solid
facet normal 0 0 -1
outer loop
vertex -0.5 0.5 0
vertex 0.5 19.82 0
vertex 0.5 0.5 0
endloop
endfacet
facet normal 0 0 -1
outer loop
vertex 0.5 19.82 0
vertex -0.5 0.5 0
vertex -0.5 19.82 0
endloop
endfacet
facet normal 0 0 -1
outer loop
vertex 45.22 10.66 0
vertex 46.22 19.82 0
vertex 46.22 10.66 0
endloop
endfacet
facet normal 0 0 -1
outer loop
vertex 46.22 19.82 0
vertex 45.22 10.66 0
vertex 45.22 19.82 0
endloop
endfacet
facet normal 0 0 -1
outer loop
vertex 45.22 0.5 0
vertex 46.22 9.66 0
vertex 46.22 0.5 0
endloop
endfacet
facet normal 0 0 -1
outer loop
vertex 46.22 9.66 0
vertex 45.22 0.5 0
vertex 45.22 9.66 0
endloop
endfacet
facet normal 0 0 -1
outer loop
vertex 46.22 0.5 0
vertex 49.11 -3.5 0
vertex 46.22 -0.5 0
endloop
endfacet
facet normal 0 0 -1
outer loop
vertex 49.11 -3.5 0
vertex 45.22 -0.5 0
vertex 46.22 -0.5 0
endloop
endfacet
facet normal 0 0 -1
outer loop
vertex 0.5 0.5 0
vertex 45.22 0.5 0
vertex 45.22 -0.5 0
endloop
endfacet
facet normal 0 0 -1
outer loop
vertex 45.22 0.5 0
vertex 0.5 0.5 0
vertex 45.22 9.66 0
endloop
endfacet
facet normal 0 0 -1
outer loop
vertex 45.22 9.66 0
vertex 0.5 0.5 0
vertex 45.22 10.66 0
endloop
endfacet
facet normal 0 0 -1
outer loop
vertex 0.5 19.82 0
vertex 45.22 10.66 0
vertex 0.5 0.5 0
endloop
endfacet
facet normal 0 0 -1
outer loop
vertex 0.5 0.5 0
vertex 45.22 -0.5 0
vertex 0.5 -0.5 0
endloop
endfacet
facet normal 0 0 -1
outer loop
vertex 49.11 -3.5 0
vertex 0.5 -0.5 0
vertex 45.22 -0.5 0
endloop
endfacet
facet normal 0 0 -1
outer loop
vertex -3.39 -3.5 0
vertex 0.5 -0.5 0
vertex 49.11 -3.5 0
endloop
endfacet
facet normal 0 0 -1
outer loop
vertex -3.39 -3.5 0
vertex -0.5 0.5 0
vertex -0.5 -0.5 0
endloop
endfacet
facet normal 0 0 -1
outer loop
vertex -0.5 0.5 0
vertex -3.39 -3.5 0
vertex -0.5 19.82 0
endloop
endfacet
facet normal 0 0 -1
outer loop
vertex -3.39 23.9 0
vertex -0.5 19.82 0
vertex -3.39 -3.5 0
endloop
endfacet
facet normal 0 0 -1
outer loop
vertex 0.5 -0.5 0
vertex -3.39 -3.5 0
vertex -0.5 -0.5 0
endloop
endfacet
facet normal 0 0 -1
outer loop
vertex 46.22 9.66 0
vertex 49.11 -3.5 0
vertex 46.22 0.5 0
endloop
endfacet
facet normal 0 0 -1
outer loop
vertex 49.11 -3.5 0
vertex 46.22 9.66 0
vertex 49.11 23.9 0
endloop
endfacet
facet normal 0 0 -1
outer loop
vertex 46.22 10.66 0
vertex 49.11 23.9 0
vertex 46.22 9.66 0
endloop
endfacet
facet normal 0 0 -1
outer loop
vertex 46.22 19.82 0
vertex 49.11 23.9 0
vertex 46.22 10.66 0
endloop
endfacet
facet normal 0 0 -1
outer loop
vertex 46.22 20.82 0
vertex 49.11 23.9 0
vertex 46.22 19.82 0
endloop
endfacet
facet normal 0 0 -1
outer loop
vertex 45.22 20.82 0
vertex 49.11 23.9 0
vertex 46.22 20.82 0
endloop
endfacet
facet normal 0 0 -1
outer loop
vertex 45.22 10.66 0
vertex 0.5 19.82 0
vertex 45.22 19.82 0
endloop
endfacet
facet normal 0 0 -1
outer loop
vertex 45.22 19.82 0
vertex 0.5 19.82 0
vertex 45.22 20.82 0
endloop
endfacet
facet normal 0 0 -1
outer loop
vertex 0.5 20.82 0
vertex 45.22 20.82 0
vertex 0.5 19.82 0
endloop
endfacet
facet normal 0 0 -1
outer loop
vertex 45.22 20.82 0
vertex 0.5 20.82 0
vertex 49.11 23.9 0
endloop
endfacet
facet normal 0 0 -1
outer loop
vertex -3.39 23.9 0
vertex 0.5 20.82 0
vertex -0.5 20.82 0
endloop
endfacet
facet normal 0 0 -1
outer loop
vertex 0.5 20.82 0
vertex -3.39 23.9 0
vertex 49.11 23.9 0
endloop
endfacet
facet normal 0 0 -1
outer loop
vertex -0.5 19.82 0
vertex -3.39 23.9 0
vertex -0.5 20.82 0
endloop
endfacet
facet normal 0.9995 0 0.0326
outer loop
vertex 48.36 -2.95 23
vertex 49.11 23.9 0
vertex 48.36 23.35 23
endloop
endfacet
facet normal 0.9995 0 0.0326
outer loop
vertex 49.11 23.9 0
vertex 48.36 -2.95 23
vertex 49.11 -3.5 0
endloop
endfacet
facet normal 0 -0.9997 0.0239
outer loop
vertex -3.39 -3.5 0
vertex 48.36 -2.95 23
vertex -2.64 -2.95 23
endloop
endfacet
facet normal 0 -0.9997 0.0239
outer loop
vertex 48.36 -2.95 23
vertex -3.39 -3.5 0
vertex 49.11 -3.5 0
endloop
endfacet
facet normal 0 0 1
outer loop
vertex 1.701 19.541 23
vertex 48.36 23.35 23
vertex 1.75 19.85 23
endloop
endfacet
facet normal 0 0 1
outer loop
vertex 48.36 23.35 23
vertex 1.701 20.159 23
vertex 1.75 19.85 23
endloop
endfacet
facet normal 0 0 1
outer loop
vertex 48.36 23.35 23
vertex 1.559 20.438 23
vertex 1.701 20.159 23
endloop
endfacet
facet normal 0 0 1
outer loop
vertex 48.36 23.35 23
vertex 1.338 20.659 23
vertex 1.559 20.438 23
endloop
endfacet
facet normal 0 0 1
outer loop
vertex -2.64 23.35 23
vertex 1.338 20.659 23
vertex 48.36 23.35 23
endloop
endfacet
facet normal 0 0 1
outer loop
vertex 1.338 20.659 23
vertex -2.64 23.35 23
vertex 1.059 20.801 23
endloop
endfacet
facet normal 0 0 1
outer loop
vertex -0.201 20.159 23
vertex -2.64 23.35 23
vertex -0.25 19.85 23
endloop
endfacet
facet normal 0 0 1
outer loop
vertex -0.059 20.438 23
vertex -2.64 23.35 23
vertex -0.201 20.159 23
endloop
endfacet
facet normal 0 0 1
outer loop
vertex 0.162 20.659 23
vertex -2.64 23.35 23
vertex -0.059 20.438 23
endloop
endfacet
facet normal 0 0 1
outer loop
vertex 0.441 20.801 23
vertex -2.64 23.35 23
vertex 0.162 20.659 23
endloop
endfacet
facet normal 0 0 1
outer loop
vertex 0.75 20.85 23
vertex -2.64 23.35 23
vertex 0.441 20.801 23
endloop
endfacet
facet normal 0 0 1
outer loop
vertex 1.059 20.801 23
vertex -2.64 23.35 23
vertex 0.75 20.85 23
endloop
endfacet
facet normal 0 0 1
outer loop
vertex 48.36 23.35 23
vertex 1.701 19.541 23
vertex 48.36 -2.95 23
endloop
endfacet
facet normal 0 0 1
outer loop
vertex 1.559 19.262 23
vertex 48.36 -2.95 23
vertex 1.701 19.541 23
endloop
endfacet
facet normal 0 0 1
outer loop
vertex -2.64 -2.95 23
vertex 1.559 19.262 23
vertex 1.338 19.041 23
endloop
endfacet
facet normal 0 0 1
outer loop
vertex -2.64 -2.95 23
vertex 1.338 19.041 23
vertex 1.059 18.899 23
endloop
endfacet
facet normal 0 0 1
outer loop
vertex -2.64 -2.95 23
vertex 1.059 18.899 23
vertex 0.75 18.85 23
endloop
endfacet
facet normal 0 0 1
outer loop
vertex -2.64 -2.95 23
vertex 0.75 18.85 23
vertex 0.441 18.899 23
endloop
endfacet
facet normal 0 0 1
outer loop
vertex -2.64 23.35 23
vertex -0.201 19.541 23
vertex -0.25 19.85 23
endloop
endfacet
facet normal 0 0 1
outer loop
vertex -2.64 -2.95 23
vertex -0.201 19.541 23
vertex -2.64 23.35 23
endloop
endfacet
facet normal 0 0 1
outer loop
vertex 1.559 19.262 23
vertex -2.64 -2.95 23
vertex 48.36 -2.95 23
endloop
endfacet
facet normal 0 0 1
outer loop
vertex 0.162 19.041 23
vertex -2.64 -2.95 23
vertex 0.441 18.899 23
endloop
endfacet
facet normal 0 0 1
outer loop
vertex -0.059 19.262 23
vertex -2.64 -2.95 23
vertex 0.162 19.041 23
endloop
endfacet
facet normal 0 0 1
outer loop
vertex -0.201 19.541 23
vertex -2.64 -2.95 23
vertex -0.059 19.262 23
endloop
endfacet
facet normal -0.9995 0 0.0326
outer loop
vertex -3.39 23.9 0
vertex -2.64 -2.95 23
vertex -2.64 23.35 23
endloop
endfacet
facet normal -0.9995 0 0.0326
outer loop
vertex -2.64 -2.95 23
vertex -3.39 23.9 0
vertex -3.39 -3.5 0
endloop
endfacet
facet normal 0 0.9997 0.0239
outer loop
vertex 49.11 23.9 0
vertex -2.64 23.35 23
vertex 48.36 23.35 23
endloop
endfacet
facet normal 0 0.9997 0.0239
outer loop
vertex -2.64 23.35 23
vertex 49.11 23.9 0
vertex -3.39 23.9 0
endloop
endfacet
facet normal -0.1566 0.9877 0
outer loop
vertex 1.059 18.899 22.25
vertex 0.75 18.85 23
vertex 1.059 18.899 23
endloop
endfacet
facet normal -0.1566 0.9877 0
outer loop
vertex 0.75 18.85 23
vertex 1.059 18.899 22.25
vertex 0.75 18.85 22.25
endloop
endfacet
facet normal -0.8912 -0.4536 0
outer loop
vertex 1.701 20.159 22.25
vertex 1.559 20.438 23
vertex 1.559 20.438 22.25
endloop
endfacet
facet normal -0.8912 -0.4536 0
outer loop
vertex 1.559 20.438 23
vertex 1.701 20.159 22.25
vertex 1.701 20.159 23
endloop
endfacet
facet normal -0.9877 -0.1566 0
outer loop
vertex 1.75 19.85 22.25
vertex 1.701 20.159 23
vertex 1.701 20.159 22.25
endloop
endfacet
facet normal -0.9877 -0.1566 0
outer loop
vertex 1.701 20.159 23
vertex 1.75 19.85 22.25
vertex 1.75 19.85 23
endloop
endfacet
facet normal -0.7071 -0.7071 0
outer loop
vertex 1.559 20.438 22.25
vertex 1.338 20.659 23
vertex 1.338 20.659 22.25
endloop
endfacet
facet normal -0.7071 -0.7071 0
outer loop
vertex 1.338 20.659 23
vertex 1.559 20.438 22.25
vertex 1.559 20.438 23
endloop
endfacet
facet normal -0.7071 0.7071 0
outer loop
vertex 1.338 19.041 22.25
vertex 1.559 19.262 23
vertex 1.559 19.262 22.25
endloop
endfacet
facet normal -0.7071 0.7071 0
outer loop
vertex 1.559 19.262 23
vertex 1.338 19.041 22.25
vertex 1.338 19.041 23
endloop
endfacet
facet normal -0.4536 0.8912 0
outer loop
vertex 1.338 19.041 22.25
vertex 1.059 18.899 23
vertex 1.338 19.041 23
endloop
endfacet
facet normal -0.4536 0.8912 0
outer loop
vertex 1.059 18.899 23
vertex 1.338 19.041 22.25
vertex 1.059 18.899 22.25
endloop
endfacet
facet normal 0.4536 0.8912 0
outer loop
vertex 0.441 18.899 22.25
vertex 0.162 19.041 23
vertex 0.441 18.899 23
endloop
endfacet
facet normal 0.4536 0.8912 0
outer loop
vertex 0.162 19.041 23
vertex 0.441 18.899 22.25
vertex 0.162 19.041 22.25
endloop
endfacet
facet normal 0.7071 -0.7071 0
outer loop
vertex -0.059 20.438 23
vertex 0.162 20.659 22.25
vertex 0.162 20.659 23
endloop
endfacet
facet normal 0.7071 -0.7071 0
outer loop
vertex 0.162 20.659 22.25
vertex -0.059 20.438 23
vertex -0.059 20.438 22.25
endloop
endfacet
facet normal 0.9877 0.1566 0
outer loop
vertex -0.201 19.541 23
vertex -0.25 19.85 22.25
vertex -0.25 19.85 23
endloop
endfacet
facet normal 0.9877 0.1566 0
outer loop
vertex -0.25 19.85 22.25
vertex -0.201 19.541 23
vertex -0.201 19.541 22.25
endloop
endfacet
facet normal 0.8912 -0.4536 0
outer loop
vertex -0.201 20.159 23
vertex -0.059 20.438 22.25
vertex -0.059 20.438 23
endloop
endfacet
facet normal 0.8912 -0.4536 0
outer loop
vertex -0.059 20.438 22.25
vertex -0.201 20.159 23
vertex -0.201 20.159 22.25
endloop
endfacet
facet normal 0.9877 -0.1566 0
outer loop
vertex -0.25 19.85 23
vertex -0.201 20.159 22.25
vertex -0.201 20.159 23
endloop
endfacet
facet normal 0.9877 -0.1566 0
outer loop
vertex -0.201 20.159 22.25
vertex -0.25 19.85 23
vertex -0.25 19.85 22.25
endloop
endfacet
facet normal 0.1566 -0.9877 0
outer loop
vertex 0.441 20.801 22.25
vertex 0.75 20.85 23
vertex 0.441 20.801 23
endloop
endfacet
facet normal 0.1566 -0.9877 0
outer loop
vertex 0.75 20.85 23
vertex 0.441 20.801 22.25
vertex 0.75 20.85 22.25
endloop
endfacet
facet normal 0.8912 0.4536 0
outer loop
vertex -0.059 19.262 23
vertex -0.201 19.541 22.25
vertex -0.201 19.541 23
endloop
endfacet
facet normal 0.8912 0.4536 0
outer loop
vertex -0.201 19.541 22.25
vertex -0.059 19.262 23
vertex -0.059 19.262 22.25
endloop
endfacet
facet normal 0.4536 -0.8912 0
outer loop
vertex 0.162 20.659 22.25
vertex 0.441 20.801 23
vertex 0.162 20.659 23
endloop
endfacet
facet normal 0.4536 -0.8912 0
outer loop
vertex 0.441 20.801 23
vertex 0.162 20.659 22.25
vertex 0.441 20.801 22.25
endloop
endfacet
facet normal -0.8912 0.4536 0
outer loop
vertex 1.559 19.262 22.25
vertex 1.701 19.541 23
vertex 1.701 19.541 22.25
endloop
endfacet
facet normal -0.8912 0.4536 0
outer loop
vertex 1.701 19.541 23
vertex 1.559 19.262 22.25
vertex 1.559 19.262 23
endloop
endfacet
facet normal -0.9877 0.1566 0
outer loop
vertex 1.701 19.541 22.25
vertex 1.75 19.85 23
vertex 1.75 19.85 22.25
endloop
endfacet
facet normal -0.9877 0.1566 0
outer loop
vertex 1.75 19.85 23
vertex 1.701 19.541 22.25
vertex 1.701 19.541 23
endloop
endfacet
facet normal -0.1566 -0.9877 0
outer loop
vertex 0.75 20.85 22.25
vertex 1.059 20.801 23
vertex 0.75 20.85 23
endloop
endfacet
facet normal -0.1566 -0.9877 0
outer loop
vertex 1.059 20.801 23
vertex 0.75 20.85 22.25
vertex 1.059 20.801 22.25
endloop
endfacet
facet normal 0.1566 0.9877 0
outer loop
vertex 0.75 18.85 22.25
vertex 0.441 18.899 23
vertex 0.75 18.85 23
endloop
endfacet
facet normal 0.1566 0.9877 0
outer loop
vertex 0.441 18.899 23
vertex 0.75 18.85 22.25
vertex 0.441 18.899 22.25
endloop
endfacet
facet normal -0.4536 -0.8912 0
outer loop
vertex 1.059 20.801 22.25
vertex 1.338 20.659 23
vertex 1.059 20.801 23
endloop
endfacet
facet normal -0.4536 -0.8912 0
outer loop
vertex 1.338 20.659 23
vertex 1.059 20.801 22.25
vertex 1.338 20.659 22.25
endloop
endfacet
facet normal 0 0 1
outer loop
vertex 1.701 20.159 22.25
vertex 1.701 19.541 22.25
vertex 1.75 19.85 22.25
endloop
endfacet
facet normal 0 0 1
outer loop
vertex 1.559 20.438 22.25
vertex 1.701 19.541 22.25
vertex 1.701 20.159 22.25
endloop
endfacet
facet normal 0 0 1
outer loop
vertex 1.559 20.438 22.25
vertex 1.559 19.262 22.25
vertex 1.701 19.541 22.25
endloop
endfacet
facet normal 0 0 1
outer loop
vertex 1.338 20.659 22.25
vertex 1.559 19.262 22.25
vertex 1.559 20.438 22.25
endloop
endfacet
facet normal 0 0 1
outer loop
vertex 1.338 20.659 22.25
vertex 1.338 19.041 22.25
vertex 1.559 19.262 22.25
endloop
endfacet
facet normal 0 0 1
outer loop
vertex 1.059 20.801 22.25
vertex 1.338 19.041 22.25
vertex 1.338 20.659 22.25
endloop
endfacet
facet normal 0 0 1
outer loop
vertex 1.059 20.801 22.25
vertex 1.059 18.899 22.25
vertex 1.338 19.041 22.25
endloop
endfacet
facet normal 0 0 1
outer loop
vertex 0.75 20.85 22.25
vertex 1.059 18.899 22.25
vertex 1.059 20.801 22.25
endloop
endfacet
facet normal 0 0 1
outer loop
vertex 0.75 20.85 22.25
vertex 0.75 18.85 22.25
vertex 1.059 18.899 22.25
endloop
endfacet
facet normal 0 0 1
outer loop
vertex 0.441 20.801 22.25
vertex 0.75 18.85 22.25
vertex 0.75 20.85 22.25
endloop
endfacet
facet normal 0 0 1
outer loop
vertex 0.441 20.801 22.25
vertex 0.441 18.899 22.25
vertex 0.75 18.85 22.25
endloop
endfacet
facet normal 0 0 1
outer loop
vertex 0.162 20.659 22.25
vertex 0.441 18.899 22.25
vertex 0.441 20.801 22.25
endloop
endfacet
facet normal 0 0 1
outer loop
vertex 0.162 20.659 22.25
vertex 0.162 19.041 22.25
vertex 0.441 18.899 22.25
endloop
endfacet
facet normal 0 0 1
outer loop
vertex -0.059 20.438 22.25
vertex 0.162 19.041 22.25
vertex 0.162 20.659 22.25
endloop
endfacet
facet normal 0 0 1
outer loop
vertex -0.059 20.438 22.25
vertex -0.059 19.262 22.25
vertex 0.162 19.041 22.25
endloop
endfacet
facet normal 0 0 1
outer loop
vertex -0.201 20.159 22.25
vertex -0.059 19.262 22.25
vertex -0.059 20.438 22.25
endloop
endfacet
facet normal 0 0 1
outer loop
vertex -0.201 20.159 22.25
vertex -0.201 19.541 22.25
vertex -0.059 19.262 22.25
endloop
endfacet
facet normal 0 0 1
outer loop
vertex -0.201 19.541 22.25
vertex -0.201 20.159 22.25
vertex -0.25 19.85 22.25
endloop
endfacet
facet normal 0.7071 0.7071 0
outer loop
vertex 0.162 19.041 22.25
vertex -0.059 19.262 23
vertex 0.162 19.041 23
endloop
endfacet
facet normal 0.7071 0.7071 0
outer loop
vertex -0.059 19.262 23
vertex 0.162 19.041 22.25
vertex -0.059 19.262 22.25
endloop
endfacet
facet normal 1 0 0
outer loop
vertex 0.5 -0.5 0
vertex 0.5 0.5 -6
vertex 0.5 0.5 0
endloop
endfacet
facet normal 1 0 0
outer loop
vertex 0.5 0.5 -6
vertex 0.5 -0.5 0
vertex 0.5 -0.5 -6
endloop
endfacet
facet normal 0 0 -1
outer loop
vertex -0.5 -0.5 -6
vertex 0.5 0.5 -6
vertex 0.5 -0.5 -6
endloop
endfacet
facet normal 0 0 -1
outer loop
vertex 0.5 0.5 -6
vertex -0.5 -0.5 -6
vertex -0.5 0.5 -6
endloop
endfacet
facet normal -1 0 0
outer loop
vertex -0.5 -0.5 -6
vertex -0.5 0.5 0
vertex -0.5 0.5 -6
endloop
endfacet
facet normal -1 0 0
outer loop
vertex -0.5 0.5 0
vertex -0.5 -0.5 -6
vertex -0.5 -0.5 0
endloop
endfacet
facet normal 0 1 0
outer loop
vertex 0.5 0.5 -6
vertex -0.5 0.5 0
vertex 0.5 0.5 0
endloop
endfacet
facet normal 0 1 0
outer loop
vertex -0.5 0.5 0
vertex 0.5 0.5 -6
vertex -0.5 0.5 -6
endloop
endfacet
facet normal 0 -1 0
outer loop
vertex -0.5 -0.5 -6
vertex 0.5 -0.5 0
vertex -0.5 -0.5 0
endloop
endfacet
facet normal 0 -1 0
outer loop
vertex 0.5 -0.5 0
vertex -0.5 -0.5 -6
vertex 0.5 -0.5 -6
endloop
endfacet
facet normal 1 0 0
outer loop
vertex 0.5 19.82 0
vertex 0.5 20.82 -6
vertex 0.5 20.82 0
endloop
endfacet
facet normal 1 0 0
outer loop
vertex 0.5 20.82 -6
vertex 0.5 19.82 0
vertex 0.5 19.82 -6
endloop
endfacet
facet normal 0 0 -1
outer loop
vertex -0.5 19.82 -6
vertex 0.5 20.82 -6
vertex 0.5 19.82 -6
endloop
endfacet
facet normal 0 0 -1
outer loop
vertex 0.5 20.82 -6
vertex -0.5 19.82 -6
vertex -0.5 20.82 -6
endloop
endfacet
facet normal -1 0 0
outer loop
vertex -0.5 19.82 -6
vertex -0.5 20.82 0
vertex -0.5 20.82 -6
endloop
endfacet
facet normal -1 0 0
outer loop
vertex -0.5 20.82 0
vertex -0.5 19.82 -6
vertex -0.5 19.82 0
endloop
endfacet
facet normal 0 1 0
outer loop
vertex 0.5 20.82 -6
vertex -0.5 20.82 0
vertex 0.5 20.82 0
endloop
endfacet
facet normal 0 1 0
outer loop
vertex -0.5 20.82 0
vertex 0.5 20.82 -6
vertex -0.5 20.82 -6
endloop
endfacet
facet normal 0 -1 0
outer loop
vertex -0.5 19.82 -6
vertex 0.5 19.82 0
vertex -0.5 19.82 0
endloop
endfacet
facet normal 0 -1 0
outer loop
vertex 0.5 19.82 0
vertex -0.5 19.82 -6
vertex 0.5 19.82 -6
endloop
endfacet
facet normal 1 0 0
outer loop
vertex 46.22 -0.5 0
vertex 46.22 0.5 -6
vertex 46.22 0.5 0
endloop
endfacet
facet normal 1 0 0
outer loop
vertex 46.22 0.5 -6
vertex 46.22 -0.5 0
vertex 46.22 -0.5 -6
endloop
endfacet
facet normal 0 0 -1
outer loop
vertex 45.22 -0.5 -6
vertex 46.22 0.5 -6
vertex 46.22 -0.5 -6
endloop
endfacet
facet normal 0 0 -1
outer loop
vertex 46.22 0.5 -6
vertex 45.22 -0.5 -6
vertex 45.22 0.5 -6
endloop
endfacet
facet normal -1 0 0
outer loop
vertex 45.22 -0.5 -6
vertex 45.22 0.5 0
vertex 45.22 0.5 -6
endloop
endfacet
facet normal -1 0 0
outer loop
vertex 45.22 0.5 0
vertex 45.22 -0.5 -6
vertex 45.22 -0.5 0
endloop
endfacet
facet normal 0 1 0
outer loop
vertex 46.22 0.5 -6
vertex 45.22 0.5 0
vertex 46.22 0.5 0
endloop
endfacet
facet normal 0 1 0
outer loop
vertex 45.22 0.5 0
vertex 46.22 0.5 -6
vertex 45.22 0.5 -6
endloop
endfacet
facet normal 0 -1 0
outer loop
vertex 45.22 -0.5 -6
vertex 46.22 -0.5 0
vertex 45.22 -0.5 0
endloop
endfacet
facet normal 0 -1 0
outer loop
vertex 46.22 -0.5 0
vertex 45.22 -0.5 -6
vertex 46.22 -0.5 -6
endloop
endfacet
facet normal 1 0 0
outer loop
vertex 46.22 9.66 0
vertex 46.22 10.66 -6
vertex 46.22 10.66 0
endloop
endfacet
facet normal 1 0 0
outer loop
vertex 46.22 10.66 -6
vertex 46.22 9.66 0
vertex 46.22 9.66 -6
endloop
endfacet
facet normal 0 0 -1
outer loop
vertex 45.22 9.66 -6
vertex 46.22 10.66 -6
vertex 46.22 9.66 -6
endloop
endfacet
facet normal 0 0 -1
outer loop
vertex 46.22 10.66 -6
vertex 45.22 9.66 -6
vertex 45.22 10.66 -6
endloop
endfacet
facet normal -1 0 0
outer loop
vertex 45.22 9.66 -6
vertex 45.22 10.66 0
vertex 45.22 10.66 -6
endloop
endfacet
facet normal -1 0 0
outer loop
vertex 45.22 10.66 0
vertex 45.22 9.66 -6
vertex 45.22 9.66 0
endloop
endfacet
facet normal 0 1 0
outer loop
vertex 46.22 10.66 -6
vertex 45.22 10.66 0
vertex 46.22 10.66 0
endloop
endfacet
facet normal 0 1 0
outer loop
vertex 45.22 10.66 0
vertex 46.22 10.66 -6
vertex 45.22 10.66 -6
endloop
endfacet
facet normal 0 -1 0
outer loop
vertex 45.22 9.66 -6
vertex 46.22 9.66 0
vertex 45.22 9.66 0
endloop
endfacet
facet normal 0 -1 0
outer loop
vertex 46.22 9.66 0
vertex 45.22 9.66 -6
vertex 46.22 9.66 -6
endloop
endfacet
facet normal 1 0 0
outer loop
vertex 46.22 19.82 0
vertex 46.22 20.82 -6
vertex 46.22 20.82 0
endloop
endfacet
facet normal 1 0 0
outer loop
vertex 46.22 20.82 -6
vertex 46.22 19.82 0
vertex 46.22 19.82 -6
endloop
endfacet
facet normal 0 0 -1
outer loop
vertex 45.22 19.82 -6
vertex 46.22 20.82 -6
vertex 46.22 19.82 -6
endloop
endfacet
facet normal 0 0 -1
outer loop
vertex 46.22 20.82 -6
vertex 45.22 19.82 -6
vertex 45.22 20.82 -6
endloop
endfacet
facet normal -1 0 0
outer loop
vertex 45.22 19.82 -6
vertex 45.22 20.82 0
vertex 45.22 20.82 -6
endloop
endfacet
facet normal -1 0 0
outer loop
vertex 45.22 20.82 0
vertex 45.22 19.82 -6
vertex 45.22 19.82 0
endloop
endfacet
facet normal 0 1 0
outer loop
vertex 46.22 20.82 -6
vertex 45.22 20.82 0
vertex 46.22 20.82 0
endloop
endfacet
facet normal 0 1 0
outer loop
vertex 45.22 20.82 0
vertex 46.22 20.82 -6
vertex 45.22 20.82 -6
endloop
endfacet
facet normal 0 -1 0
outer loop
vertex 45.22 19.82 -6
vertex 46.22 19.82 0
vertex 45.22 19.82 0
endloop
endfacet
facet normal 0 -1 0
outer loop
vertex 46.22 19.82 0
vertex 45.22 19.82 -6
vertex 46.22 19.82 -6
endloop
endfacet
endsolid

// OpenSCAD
lB=52.5;
wB=27.4;
lT=51;
wT=26.3;
h=23;

oL=3.39;
oW=3.5;
pW=1;
pH=6;


module body(){
    translate([lB/2-oL,wB/2-oW,0])
    difference(){
        color("gray")
        polyhedron(
        points=[
        [-lB/2,-wB/2,0],
        [-lB/2,wB/2,0],
        [lB/2,wB/2,0],
        [lB/2,-wB/2,0],
        [-lT/2,-wT/2,h],
        [-lT/2,wT/2,h],
        [lT/2,wT/2,h],
        [lT/2,-wT/2,h]
        ],
        faces=[
        [0,3,2,1],
        [4,5,6,7],
        [0,4,7,3],
        [5,4,0,1],
        [6,5,1,2],
        [7,6,2,3],
        ]);

    translate([-lT/2+oL,wT/2-oW,h-0.25])color("gray")cylinder(r=1,h=1,center=true,$fn=20);
    }

}

module pin(x,y){
translate([2.54*x,2.54*y,-pH/2])color("gold")cube([pW,pW,pH],center=true);
}

union() {
    body();
    pin(0,0);
    pin(0,8);
    pin(18,0);
    pin(18,4);
    pin(18,8);
}
